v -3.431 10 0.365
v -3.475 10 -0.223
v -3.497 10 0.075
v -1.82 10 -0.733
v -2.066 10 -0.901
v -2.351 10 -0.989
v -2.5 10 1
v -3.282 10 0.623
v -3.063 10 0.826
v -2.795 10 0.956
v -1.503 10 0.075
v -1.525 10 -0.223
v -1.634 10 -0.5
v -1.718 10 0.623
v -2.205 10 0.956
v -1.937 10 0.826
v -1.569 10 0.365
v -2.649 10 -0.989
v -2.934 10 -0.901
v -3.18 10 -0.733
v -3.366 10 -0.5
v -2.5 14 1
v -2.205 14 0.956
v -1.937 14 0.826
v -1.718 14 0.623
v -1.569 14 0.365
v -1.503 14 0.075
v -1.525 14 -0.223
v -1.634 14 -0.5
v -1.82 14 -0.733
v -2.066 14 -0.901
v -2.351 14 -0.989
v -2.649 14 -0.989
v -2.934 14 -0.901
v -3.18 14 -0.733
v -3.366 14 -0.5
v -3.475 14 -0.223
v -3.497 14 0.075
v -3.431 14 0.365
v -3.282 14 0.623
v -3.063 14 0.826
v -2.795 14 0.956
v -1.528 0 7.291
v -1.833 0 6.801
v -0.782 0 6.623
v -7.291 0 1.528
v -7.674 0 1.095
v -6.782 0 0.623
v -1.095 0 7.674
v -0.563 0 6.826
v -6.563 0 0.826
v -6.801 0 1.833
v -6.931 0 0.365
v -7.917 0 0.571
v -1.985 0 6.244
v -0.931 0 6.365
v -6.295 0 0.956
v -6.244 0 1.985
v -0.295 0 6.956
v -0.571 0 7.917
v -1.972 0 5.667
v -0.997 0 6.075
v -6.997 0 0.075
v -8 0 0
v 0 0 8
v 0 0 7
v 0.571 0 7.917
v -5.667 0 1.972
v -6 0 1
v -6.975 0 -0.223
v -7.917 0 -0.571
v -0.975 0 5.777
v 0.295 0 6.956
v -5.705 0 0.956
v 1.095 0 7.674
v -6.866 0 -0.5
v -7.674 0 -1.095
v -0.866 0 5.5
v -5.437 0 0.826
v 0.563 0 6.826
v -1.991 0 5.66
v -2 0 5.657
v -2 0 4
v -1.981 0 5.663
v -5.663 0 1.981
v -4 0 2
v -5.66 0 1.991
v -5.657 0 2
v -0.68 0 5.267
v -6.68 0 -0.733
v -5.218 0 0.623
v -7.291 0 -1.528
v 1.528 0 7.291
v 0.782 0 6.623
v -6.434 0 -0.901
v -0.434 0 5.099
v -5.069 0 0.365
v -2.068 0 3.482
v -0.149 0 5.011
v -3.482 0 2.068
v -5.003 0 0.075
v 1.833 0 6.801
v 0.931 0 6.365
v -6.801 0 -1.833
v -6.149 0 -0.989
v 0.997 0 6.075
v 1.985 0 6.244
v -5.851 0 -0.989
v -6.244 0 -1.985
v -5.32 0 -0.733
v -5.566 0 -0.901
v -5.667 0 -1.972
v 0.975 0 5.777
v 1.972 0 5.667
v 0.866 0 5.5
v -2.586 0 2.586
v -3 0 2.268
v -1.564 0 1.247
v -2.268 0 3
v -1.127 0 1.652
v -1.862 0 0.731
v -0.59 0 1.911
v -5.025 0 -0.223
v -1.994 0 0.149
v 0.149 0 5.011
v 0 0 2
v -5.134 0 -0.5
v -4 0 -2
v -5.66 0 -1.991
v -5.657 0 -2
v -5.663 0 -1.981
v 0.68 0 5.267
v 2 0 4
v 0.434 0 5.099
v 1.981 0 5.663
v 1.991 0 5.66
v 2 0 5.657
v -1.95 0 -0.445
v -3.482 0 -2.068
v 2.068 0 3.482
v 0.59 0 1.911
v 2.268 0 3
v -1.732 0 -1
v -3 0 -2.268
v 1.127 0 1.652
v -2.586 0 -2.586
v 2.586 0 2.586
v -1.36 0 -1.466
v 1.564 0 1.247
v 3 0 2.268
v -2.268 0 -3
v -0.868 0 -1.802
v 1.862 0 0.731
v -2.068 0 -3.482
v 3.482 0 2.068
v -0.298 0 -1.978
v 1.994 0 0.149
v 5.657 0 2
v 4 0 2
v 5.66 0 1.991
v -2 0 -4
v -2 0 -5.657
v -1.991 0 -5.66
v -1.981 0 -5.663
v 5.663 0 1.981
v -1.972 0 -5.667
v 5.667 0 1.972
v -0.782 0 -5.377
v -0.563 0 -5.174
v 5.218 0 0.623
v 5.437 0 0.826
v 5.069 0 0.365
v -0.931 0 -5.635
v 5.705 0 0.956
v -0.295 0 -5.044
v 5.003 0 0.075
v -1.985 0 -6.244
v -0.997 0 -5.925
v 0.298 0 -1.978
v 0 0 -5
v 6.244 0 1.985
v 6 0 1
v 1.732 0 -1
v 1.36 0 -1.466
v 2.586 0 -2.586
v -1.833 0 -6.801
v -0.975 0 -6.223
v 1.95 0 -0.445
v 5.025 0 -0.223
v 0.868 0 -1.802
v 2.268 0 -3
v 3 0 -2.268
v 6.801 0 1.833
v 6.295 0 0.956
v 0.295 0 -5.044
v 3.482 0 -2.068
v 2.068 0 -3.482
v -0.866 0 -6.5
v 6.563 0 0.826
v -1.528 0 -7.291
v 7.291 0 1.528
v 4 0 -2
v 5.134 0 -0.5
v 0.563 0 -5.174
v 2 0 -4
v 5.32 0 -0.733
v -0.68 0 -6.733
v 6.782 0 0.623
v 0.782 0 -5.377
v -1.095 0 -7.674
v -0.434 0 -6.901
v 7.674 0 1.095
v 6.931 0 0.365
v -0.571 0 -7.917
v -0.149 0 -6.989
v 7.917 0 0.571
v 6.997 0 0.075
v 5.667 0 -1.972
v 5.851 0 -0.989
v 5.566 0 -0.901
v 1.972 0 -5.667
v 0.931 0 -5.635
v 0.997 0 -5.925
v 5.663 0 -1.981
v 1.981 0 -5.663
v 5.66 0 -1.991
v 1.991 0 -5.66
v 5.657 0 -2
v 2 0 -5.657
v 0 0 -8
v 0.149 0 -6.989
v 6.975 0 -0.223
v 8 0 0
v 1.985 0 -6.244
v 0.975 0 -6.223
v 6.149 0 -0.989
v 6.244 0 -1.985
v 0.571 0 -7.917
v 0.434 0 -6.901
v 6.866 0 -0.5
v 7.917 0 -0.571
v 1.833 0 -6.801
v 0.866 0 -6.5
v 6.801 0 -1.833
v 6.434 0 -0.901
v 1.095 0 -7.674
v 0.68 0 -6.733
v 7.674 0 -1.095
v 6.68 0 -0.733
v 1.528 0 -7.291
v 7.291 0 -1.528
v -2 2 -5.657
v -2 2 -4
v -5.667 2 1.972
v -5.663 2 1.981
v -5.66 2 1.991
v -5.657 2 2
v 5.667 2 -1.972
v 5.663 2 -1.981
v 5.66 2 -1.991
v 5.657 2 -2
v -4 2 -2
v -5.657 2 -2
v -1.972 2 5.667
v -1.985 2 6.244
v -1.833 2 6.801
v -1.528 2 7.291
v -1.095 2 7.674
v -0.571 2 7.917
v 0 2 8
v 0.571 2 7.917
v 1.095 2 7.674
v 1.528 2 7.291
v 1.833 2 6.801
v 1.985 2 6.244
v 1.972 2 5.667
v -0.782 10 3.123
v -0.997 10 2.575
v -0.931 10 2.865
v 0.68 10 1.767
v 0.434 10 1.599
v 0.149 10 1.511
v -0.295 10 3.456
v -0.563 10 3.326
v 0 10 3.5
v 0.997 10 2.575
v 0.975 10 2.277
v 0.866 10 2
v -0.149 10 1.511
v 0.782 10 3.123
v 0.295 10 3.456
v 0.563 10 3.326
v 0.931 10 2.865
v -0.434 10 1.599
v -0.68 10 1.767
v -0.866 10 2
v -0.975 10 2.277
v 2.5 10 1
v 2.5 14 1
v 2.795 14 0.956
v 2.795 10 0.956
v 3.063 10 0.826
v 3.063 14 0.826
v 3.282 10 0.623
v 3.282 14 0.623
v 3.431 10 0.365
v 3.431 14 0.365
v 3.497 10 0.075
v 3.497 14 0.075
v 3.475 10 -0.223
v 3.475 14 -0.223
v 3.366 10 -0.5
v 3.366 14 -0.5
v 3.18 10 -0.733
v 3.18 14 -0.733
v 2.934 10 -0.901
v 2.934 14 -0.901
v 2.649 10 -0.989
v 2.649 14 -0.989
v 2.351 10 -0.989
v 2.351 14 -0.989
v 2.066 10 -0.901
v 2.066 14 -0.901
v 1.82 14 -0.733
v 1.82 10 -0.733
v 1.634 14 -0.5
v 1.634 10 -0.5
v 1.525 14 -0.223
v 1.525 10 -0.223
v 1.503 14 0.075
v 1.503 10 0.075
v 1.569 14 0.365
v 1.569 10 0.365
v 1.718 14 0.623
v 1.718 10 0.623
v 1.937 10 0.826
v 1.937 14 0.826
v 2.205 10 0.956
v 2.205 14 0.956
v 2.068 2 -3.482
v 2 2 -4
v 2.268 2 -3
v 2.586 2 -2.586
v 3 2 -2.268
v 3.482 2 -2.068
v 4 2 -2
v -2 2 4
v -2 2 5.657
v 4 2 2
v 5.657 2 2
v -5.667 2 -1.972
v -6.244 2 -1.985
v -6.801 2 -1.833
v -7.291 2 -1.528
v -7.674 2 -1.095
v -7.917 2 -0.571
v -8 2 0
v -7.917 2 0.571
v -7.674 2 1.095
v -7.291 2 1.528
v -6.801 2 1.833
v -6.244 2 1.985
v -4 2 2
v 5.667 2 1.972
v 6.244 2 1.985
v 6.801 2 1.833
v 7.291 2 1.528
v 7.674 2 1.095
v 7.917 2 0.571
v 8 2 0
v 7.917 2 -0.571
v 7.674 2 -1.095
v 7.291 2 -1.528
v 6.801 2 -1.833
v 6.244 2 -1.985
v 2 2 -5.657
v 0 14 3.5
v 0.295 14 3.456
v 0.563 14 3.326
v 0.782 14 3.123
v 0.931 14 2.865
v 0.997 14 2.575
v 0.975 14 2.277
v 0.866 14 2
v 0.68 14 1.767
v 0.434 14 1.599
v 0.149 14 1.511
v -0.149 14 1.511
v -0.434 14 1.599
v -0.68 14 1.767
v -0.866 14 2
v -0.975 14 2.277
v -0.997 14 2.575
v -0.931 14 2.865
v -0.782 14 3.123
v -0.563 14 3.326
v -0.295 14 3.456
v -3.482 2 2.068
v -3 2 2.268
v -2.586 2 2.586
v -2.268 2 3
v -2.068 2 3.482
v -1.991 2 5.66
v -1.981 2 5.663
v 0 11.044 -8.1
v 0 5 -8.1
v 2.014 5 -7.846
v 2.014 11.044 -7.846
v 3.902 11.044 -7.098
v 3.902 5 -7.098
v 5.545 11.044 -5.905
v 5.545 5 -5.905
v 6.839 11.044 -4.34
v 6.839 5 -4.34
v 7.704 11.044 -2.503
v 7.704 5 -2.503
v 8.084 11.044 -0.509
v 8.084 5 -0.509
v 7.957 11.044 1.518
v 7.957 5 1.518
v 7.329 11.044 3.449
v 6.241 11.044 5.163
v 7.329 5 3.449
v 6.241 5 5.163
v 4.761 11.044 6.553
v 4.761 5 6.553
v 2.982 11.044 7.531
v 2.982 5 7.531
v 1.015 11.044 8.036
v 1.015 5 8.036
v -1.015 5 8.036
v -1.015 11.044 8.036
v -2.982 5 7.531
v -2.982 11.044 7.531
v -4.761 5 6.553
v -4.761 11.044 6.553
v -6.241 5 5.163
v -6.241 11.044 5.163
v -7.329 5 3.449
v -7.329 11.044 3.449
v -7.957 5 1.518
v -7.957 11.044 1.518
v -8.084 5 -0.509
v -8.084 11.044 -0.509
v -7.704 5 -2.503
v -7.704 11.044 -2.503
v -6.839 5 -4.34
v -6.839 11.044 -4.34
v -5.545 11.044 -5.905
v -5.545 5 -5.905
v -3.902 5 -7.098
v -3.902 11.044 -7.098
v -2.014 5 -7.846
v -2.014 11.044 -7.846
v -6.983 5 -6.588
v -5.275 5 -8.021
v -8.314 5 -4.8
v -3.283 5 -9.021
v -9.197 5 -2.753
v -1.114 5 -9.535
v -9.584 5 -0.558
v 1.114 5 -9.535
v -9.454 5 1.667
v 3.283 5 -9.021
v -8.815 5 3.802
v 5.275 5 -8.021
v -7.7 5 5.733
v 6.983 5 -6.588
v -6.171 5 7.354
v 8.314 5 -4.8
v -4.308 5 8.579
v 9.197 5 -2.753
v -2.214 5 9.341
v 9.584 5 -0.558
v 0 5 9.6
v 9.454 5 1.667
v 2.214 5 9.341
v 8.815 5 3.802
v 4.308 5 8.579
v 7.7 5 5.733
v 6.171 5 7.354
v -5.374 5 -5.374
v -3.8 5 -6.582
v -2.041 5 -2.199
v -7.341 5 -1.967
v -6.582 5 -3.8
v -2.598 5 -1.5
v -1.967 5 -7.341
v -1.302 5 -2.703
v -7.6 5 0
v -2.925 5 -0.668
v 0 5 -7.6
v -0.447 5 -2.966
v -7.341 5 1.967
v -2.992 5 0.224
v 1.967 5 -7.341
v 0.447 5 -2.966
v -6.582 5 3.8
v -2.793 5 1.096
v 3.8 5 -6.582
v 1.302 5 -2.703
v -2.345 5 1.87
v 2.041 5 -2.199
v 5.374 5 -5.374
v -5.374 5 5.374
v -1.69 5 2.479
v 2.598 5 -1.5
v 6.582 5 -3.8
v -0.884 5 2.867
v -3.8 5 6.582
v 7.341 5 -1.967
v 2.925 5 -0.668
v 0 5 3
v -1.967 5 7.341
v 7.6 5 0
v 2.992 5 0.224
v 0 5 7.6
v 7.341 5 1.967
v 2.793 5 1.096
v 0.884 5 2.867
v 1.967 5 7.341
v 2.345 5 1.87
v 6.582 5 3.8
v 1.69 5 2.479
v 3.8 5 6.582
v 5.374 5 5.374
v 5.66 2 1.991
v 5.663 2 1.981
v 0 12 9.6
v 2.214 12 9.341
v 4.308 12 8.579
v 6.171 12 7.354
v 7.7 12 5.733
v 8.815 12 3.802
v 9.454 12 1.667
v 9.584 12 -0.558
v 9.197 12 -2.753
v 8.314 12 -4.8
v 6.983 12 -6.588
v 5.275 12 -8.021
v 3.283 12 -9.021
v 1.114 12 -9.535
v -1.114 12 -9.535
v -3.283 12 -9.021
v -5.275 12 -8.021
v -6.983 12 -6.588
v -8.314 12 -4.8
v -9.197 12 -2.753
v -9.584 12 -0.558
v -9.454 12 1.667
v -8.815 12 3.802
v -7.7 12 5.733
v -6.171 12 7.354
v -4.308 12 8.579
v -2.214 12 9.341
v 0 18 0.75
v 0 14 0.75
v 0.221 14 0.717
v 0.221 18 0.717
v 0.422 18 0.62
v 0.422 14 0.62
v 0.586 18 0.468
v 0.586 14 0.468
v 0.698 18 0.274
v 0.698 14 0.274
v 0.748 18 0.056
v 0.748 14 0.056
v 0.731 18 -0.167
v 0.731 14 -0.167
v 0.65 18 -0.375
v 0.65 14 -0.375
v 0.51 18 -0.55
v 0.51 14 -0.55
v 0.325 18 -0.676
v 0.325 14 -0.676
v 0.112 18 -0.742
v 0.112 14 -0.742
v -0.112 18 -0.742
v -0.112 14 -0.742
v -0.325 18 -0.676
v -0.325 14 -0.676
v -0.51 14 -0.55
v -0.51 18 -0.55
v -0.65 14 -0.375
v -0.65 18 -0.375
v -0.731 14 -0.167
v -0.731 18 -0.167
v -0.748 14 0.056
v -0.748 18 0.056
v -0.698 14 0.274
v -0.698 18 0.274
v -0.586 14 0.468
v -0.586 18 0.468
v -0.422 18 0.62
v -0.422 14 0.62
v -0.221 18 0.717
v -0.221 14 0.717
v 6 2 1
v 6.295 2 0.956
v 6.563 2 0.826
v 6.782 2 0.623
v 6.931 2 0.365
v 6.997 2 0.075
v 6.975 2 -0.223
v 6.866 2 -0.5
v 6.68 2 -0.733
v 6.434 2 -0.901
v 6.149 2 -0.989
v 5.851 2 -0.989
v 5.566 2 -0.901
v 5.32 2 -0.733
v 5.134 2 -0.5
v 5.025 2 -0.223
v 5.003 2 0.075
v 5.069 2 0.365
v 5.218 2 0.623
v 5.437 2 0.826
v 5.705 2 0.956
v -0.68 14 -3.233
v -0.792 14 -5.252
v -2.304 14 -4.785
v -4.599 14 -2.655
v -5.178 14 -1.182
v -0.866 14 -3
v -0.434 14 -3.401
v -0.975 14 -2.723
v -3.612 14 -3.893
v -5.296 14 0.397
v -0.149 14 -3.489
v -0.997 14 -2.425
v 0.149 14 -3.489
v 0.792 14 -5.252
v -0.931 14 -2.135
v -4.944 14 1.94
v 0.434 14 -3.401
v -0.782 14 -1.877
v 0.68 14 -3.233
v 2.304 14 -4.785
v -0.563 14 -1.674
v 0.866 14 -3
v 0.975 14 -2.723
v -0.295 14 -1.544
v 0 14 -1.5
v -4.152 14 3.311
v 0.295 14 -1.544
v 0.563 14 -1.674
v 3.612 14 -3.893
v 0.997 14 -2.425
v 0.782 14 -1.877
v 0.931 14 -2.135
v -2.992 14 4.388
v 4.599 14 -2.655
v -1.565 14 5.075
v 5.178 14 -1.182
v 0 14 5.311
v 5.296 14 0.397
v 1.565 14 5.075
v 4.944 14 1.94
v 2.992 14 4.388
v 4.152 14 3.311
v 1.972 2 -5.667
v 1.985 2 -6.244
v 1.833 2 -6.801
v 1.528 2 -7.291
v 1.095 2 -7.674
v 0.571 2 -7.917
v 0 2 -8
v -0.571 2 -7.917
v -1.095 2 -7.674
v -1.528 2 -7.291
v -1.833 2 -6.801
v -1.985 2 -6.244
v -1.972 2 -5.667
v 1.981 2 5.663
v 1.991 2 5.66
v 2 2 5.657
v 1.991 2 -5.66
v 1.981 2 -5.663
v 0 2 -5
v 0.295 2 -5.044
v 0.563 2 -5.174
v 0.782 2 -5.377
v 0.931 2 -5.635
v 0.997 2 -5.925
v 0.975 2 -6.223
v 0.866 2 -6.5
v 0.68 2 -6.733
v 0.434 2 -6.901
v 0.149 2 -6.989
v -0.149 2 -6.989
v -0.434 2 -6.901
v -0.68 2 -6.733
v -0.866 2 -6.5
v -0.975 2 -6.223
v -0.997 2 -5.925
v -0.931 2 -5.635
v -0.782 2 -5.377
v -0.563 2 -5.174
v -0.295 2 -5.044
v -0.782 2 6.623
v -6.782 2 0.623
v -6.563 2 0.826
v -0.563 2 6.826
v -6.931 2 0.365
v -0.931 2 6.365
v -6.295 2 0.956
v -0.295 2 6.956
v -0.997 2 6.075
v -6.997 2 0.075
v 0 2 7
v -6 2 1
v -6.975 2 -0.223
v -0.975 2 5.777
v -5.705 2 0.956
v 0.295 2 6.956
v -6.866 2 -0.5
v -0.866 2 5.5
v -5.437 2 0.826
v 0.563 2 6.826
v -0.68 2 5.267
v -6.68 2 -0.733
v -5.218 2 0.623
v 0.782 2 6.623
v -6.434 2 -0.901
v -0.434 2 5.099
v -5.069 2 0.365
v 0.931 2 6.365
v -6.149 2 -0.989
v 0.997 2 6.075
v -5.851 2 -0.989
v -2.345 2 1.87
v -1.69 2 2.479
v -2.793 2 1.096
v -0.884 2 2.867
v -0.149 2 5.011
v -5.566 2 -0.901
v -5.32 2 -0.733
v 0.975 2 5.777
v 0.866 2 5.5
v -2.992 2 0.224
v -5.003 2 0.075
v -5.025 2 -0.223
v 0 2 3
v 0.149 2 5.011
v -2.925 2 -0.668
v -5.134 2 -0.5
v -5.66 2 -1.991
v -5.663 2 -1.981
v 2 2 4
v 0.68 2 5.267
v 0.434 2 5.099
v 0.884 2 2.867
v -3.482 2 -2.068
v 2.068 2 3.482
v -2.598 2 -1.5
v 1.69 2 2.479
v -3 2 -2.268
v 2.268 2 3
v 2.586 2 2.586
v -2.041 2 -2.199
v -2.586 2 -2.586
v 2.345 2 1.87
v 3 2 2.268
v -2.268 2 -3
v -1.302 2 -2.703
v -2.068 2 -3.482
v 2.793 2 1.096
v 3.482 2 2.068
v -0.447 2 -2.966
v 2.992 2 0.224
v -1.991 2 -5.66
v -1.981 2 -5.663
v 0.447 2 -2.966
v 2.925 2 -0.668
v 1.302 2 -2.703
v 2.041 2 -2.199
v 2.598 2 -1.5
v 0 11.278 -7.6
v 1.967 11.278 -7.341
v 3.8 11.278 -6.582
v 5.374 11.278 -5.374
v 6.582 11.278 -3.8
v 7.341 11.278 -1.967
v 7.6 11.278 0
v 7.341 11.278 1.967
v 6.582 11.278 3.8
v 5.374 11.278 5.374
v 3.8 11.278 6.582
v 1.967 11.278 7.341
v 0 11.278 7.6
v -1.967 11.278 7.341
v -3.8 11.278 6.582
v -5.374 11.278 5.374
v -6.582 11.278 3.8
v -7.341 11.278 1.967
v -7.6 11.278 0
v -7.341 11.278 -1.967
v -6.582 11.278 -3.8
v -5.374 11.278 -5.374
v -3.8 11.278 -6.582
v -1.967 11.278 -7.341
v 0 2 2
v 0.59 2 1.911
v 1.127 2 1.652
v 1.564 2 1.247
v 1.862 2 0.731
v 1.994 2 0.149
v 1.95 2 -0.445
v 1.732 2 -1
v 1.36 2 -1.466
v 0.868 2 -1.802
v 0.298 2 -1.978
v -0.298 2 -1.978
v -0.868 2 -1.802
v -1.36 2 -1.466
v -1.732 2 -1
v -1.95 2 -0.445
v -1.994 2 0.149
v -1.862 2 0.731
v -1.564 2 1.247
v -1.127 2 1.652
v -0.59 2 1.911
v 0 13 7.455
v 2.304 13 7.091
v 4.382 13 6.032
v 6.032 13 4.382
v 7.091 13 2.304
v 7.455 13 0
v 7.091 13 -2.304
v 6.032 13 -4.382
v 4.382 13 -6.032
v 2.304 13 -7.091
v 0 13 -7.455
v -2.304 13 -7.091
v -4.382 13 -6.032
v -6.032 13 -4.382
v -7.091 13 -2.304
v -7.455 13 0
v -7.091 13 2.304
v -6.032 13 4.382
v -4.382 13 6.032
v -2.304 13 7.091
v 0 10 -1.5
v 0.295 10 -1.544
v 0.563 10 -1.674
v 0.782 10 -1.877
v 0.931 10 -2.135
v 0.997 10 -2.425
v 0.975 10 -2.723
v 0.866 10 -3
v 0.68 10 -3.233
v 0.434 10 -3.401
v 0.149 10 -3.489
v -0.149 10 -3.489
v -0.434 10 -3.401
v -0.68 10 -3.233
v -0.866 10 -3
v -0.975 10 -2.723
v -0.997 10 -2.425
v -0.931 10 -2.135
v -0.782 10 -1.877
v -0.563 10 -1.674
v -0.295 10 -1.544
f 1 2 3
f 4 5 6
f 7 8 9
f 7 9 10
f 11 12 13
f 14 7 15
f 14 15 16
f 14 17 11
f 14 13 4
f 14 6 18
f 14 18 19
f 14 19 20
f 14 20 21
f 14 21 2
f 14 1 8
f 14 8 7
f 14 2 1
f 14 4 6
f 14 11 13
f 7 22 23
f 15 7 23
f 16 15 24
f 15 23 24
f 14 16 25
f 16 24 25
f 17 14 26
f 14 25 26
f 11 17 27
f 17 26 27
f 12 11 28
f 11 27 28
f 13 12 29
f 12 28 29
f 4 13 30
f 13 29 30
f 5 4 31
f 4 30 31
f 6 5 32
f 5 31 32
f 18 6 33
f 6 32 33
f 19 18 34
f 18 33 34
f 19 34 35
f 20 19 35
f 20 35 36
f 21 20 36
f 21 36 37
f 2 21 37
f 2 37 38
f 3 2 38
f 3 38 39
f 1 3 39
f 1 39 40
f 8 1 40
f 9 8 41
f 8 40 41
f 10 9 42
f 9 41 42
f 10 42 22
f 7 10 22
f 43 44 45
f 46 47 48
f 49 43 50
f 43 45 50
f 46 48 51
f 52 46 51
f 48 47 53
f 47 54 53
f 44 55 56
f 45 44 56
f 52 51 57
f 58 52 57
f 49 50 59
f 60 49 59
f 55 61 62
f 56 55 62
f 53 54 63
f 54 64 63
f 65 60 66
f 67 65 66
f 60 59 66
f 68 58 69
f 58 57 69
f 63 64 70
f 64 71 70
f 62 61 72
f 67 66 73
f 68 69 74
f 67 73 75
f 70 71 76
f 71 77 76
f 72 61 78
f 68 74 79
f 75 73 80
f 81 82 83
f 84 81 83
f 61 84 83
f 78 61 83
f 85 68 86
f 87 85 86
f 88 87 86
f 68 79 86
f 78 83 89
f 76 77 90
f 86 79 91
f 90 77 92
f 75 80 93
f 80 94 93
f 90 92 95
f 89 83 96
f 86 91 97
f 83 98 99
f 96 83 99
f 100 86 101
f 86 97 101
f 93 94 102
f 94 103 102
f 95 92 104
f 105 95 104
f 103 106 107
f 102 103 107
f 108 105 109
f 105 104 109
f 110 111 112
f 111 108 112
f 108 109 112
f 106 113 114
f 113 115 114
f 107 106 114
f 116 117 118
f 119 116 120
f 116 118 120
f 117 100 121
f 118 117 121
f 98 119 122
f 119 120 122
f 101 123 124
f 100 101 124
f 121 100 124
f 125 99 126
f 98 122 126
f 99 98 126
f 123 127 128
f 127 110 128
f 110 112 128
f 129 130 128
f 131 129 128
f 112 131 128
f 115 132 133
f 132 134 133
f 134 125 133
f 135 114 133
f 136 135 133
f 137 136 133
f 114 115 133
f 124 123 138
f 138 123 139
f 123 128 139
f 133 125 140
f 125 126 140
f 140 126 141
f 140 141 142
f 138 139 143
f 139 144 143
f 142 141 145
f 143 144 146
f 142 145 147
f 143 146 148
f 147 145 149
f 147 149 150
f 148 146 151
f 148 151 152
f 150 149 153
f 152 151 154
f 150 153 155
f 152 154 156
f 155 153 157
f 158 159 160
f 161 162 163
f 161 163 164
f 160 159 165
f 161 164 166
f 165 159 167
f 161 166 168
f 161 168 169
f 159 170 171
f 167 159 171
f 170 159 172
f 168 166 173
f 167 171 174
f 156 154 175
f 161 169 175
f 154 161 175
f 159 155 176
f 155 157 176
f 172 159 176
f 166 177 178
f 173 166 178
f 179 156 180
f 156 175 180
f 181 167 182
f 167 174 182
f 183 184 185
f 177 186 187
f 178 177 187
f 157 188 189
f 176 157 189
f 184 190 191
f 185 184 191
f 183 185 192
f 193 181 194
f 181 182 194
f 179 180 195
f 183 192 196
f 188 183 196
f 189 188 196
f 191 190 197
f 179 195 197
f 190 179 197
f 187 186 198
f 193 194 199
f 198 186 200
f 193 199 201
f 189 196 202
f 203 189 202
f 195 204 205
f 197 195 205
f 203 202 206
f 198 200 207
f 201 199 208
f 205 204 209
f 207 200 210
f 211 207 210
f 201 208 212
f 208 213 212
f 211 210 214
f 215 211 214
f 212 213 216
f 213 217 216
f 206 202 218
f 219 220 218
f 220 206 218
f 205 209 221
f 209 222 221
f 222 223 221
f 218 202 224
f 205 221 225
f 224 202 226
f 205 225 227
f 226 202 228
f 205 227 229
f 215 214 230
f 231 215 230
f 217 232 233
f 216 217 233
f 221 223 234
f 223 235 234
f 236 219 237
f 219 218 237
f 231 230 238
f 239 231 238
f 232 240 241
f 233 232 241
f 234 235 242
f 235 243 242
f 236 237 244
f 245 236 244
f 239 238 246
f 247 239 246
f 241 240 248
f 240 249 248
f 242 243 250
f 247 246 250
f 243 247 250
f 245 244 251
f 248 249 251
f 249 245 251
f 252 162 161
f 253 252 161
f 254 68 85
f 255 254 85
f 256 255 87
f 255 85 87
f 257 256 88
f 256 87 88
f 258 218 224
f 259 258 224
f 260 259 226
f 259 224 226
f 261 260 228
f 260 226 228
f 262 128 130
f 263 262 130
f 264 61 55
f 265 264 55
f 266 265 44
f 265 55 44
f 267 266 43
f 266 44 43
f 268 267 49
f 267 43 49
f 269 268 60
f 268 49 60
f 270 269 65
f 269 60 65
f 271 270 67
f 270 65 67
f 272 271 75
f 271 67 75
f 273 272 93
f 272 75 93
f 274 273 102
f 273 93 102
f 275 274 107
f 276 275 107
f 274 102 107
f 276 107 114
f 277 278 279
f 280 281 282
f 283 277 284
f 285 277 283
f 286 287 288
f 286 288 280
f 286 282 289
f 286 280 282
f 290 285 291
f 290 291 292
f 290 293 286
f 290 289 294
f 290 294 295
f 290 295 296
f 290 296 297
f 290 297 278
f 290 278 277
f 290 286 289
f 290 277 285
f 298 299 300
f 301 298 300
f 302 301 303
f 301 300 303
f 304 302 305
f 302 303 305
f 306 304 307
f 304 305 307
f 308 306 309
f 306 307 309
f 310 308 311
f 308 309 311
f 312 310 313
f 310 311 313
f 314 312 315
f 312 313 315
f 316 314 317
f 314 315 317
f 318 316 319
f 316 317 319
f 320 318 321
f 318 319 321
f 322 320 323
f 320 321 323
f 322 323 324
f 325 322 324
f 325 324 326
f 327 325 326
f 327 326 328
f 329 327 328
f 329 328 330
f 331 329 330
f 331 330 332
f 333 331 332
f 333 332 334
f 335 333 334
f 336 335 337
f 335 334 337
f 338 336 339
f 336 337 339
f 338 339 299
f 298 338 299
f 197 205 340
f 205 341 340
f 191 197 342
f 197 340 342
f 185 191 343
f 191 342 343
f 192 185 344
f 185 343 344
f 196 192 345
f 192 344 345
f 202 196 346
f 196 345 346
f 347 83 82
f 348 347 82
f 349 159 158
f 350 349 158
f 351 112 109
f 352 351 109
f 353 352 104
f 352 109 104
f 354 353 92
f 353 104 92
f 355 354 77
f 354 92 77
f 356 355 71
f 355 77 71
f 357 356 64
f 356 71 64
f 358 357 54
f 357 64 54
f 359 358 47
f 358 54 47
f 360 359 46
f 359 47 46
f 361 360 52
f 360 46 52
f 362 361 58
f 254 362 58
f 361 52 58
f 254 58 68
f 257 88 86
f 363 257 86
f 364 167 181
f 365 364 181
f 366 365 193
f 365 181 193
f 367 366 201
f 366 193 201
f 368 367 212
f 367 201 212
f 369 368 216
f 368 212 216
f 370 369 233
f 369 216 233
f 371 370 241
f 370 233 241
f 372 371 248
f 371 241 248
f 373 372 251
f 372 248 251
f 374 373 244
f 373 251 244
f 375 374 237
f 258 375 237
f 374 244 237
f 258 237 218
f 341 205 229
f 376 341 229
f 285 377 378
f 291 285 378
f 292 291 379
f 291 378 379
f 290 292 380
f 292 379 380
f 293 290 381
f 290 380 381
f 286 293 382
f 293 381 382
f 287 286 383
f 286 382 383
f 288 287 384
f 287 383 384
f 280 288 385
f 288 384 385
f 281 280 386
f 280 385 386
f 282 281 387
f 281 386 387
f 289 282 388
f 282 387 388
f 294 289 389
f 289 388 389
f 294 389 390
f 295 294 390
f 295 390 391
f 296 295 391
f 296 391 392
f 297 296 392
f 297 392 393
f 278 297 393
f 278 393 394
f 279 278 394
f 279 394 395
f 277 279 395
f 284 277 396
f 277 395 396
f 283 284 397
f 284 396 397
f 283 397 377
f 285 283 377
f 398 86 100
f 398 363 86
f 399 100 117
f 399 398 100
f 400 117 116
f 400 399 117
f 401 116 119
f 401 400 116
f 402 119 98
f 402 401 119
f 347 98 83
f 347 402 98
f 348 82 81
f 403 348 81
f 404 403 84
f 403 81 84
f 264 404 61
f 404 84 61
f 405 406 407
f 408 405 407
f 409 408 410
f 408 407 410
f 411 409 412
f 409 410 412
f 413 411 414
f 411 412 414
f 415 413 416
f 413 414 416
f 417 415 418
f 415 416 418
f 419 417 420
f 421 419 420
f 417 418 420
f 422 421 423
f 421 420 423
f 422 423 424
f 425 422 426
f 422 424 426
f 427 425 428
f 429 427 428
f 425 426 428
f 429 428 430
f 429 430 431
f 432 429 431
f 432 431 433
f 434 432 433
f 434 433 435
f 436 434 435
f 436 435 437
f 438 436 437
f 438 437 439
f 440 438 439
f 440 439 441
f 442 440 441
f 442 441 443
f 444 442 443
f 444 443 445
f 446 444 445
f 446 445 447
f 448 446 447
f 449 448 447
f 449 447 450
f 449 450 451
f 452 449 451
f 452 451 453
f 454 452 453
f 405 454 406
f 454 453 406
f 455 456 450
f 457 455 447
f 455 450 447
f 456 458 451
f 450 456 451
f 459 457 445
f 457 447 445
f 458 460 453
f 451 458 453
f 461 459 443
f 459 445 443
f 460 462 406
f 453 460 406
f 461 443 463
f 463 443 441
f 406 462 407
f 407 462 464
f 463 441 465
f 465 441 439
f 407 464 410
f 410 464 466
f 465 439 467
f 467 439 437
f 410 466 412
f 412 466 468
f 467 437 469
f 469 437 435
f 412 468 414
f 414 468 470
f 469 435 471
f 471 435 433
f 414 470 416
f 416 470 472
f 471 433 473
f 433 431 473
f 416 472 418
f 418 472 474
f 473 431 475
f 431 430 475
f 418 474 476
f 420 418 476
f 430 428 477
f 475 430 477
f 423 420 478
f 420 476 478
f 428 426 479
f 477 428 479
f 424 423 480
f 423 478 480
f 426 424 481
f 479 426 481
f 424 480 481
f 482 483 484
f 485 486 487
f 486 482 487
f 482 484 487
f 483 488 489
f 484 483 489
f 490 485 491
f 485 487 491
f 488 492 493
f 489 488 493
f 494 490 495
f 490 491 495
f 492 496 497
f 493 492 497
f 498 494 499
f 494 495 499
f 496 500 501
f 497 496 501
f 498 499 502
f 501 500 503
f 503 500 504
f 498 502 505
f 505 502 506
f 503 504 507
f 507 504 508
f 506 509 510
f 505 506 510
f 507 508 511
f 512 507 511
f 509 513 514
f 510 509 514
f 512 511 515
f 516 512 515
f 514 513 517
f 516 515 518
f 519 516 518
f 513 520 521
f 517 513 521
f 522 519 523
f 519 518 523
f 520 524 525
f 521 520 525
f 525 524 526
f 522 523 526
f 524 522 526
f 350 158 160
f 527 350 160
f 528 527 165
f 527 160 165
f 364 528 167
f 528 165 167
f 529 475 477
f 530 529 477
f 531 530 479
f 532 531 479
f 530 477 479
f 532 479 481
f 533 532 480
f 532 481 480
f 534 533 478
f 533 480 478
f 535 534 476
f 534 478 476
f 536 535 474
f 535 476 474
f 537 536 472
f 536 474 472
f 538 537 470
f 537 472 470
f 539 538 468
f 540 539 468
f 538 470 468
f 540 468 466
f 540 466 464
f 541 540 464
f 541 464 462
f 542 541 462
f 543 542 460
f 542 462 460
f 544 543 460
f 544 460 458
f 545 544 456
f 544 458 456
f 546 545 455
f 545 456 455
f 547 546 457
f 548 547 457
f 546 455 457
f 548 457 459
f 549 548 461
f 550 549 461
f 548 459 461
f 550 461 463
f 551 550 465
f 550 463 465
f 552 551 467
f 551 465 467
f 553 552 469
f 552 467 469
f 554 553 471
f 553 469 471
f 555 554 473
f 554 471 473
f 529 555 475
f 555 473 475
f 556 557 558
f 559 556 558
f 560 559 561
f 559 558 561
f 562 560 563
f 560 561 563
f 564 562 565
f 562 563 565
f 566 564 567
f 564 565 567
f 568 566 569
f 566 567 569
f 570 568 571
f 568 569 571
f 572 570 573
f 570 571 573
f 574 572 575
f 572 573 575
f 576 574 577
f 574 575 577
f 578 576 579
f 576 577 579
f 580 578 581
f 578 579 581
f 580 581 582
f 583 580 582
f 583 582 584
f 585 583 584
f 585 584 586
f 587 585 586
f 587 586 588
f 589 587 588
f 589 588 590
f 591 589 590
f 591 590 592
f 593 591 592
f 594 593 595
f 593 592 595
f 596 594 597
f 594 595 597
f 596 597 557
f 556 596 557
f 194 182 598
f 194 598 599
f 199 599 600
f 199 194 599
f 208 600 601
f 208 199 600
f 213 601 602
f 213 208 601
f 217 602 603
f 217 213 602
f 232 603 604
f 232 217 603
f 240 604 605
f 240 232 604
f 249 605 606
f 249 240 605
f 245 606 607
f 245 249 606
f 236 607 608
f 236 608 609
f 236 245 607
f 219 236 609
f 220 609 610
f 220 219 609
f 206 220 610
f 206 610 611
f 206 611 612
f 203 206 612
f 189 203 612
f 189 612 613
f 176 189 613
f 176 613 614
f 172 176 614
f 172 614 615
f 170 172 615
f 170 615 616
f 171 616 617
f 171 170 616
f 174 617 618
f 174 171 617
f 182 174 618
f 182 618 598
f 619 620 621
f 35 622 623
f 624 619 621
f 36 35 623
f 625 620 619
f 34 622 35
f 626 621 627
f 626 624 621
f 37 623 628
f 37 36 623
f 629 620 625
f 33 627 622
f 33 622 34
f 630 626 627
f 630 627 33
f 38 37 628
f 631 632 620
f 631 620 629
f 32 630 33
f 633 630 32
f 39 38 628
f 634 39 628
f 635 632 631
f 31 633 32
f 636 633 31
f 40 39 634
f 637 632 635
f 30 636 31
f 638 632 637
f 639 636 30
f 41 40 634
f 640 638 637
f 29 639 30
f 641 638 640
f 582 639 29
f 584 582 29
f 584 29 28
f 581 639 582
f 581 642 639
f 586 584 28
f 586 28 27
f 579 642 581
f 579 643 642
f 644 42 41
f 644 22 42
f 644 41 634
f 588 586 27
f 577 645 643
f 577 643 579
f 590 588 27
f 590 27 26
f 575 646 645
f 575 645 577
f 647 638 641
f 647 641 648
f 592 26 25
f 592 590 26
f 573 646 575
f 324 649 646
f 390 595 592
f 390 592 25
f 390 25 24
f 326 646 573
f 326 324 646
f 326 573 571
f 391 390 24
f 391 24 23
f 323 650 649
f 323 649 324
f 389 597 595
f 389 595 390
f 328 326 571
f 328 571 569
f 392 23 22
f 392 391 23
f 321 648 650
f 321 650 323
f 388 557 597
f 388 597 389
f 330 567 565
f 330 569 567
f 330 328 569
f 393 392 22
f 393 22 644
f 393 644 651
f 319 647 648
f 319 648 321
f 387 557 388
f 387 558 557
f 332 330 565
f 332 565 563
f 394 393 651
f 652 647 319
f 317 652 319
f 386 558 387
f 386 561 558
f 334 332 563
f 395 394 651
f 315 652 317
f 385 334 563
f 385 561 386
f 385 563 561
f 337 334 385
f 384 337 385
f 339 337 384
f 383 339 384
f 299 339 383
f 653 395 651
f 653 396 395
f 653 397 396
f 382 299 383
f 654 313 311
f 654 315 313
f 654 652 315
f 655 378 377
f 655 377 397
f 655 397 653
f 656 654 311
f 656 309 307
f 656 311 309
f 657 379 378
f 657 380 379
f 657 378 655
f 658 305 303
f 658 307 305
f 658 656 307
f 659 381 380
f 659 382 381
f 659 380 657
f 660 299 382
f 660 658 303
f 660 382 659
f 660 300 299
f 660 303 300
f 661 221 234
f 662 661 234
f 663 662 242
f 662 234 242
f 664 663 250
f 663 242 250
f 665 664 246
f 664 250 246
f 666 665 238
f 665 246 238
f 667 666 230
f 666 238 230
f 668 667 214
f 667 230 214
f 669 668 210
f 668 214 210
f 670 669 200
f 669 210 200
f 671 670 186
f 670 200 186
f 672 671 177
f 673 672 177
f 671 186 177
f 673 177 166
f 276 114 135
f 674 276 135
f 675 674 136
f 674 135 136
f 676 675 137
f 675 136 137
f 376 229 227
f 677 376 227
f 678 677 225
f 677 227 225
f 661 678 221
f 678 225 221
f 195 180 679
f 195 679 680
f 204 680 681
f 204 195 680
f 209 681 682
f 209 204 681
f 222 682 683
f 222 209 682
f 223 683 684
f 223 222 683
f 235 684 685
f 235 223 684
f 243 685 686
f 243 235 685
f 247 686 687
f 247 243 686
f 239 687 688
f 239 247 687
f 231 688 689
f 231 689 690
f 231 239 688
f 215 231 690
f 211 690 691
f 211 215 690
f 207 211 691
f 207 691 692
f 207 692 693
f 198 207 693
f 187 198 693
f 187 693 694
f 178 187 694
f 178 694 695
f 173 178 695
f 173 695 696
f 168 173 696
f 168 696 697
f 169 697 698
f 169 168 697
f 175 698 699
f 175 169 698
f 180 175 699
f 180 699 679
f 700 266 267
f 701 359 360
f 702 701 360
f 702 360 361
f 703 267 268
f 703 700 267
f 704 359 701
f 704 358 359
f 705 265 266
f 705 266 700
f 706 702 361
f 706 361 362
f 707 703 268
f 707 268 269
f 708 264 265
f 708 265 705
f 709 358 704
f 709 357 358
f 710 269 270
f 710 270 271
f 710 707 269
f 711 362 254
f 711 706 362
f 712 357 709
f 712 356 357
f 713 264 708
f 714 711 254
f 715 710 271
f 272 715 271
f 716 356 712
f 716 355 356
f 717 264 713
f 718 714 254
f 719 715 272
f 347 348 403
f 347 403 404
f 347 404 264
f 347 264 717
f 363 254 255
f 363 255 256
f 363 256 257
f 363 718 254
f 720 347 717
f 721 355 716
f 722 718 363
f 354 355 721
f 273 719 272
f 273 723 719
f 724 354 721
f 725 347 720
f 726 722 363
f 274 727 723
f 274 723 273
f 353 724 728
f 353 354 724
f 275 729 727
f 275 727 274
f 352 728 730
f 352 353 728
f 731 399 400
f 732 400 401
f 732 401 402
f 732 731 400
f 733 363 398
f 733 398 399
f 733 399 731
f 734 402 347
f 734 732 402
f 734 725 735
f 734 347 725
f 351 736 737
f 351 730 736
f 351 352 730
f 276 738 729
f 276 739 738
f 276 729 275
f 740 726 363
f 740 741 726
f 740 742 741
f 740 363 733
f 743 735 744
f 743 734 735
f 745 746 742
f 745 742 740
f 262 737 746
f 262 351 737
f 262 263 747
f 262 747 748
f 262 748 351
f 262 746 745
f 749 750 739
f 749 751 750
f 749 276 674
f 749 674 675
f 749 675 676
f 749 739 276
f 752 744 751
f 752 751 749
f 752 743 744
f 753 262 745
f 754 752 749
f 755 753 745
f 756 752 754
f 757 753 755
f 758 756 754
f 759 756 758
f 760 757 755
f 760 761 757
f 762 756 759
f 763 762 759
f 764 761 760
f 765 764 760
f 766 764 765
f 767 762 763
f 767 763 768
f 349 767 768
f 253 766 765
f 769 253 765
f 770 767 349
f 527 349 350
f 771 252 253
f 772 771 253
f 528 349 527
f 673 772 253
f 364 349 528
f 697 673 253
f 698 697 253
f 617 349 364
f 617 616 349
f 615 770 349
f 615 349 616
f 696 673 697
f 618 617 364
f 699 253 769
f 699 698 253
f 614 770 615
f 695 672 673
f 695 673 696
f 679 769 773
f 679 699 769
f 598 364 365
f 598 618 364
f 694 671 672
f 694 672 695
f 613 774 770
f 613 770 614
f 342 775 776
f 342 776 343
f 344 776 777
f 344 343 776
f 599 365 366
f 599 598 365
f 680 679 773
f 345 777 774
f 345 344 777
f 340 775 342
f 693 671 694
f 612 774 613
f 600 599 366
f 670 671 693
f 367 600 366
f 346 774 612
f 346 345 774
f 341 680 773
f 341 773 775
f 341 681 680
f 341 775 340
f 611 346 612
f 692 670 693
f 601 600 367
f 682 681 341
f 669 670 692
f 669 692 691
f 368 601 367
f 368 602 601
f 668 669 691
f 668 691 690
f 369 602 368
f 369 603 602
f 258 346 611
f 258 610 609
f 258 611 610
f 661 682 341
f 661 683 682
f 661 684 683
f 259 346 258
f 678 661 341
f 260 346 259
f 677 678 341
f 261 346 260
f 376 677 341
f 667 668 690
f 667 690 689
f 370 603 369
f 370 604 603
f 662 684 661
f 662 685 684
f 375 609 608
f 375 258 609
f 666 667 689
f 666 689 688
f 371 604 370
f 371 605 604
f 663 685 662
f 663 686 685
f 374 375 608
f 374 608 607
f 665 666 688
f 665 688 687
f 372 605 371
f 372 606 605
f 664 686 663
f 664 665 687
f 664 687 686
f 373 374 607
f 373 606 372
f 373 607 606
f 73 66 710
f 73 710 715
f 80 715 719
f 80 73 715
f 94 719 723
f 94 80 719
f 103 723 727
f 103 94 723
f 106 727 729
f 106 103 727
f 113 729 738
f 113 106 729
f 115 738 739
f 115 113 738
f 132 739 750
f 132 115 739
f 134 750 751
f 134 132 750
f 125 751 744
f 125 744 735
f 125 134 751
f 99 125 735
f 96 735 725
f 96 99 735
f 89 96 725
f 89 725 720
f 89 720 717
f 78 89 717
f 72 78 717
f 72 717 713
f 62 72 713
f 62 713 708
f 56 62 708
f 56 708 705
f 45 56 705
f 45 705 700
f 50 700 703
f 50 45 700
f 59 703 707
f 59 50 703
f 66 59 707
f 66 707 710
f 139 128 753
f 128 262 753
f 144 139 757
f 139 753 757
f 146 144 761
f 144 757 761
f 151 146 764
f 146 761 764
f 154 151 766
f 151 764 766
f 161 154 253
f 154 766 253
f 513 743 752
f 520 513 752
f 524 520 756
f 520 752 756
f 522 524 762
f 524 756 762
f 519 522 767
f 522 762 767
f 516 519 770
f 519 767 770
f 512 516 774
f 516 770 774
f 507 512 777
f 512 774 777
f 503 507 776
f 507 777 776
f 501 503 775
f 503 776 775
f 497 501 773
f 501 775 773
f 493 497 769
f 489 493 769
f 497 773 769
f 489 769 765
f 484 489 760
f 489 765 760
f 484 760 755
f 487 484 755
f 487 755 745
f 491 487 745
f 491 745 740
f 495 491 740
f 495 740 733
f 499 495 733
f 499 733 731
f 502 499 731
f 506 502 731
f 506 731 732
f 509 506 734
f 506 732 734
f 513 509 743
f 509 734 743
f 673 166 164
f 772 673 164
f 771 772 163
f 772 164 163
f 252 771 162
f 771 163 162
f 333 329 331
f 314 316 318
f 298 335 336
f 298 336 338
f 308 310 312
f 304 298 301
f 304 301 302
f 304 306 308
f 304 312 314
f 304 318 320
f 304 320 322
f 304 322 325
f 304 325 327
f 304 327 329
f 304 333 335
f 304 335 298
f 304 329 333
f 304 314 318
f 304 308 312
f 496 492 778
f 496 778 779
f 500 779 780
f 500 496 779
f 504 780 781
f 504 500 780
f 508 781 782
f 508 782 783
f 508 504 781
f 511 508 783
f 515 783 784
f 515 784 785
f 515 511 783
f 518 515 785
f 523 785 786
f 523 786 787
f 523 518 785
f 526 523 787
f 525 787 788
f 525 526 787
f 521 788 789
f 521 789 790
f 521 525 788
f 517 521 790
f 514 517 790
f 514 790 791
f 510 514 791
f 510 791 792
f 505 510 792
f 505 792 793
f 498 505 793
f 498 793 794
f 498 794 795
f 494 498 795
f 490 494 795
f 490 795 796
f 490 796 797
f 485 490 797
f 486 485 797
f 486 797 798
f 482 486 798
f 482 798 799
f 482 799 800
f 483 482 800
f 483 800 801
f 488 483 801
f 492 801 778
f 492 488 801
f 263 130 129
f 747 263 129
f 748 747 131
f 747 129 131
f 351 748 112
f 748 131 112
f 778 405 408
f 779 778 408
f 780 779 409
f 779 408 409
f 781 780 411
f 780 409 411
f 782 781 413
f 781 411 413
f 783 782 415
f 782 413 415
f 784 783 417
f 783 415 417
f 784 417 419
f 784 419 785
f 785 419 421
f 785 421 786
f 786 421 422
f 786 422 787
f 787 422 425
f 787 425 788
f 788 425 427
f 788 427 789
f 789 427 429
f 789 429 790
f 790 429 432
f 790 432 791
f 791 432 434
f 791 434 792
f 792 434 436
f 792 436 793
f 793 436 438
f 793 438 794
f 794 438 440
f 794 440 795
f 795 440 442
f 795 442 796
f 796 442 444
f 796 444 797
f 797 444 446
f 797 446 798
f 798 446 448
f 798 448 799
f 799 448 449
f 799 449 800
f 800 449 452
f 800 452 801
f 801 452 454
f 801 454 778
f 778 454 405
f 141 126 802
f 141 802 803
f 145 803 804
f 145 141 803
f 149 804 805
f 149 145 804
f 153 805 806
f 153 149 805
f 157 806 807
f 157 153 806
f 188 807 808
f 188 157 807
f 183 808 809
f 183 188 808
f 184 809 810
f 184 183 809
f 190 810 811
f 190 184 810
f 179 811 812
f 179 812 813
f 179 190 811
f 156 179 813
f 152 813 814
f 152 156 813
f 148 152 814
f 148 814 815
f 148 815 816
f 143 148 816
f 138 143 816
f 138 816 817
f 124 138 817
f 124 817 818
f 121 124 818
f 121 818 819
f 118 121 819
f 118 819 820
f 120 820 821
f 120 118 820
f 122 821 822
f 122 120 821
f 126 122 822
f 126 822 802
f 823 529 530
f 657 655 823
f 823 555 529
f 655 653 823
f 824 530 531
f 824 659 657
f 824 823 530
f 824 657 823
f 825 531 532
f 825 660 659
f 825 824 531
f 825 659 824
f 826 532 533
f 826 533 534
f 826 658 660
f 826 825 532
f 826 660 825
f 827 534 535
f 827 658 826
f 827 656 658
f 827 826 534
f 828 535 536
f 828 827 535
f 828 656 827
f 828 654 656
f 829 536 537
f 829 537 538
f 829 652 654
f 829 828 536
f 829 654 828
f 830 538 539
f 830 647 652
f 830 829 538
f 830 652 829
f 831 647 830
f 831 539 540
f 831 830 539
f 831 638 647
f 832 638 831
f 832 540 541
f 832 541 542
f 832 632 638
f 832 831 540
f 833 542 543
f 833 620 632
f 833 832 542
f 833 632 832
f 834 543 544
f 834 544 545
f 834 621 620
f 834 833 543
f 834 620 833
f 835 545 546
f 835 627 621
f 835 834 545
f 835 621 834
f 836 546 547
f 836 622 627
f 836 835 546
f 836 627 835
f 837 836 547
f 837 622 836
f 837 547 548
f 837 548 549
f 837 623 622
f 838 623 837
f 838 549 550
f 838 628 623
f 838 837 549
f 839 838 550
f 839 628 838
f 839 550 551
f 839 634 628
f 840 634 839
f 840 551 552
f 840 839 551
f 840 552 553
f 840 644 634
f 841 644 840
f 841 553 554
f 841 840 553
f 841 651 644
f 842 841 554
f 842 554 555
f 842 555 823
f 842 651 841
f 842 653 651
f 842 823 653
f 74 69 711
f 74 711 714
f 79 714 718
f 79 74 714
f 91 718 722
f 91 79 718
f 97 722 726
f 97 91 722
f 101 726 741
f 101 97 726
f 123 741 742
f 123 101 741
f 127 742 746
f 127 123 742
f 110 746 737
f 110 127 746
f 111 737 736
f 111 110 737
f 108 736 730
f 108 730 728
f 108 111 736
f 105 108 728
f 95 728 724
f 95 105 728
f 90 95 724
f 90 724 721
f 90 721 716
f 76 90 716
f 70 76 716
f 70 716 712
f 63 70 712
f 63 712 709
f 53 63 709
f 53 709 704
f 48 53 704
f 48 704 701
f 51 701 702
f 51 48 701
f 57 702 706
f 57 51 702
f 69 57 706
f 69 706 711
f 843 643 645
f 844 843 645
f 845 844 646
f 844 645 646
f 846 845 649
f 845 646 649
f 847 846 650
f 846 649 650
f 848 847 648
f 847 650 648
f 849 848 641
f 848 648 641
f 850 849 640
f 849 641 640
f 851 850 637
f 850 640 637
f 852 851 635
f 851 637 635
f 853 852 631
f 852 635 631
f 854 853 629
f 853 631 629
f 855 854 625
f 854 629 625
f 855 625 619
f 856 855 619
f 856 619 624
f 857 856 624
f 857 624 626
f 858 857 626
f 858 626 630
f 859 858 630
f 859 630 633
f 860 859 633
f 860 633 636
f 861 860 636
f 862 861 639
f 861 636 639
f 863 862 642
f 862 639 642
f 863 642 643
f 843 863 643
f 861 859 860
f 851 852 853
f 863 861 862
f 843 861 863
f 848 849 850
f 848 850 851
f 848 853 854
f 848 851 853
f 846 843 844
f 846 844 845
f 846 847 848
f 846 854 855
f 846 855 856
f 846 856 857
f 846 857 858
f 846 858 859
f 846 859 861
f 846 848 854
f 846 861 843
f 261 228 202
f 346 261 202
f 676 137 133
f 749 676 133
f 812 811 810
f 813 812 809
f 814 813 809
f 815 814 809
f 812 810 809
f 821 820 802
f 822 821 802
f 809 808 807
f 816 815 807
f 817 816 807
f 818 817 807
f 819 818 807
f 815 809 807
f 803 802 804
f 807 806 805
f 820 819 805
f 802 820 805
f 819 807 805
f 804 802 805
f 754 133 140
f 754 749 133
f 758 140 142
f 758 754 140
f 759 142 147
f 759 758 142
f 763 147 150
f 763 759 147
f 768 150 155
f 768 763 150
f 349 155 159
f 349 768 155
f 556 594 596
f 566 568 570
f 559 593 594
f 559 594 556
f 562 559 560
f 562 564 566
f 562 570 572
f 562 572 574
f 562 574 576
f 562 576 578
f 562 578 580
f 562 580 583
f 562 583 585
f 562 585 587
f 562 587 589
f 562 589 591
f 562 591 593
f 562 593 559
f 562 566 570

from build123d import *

# Parameters (mm, degrees)
SKETCH1_R           = 2
SKETCH1_R_2         = 1
BOSS_EXTRUDE1_DEPTH = 2
FILLET1_R           = 2
SKETCH2_R           = 3
BOSS_EXTRUDE2_DEPTH = 3
SKETCH3_R           = 9.6
BOSS_EXTRUDE3_DEPTH = 9
SKETCH4_R           = 0.75
BOSS_EXTRUDE4_DEPTH = 4
SKETCH5_R           = 1
CUT_EXTRUDE1_DEPTH  = 4
CHAMFER1_SIZE       = 2
CHAMFER1_SIZE2      = 4.289013841
CUT_EXTRUDE2_REACH  = 20.797
SKETCH6_R           = 8.1
SKETCH6_R_2         = 7.6


with BuildPart() as part:
    # Sketch1 → Boss-Extrude1 (new body)
    with BuildSketch(Plane(origin=(0, 0, 0), x_dir=(1, 0, 0), z_dir=(0, 1, 0))):
        with BuildLine():
            Line((-5.656854249, -2), (-2, -2))
            Line((-2, -2), (-2, -5.656854249))
            ThreePointArc((-2, -5.656854249), (-1.986019357, -5.661777734), (-1.972026594, -5.666666667))
            ThreePointArc((-1.972026594, -5.666666667), (0, -8), (1.972026594, -5.666666667))
            ThreePointArc((1.972026594, -5.666666667), (1.986019357, -5.661777734), (2, -5.656854249))
            Line((2, -5.656854249), (2, -2))
            Line((2, -2), (5.656854249, -2))
            ThreePointArc((5.656854249, -2), (5.661777734, -1.986019357), (5.666666667, -1.972026594))
            ThreePointArc((5.666666667, -1.972026594), (8, 0), (5.666666667, 1.972026594))
            ThreePointArc((5.666666667, 1.972026594), (5.661777734, 1.986019357), (5.656854249, 2))
            Line((5.656854249, 2), (2, 2))
            Line((2, 2), (2, 5.656854249))
            ThreePointArc((2, 5.656854249), (1.986019357, 5.661777734), (1.972026594, 5.666666667))
            ThreePointArc((1.972026594, 5.666666667), (0, 8), (-1.972026594, 5.666666667))
            ThreePointArc((-1.972026594, 5.666666667), (-1.986019357, 5.661777734), (-2, 5.656854249))
            Line((-2, 5.656854249), (-2, 2))
            Line((-2, 2), (-5.656854249, 2))
            ThreePointArc((-5.656854249, 2), (-5.661777734, 1.986019357), (-5.666666667, 1.972026594))
            ThreePointArc((-5.666666667, 1.972026594), (-8, 0), (-5.666666667, -1.972026594))
            ThreePointArc((-5.666666667, -1.972026594), (-5.661777734, -1.986019357), (-5.656854249, -2))
        make_face()
        with Locations(Location((0, 0, 0), (0, 0, 270))):
            Circle(SKETCH1_R, mode=Mode.SUBTRACT)
        with Locations(Location((6, 0, 0), (0, 0, 270))):
            Circle(SKETCH1_R_2, mode=Mode.SUBTRACT)
        with Locations(Location((0, 6, 0), (0, 0, 270))):
            Circle(SKETCH1_R_2, mode=Mode.SUBTRACT)
        with Locations(Location((-6, 0, 0), (0, 0, 270))):
            Circle(SKETCH1_R_2, mode=Mode.SUBTRACT)
        with Locations(Location((0, -6, 0), (0, 0, 270))):
            Circle(SKETCH1_R_2, mode=Mode.SUBTRACT)
    extrude(amount=BOSS_EXTRUDE1_DEPTH)

    # Fillet1
    fillet1_edges = [part.edges().sort_by_distance(p)[0] for p in [
        (2, 1, 2),
        (-2, 1, 2),
        (-2, 1, -2),
        (2, 1, -2),
    ]]
    fillet(fillet1_edges, radius=FILLET1_R)

    # Sketch2 → Boss-Extrude2 (add)
    with BuildSketch(Plane(origin=(0, 2, 0), x_dir=(1, 0, 0), z_dir=(0, 1, 0))):
        with Locations(Location((0, 0, 0), (0, 0, 270))):
            Circle(SKETCH2_R)
    extrude(amount=BOSS_EXTRUDE2_DEPTH)

    # Sketch3 → Boss-Extrude3 (add)
    with BuildSketch(Plane(origin=(0, 5, 0), x_dir=(1, 0, 0), z_dir=(0, 1, 0))):
        with Locations(Location((0, 0, 0), (0, 0, 270))):
            Circle(SKETCH3_R)
    extrude(amount=BOSS_EXTRUDE3_DEPTH)

    # Sketch4 → Boss-Extrude4 (add)
    with BuildSketch(Plane(origin=(0, 14, 0), x_dir=(1, 0, 0), z_dir=(0, 1, 0))):
        with Locations(Location((0, 0, 0), (0, 0, 270))):
            Circle(SKETCH4_R)
    extrude(amount=BOSS_EXTRUDE4_DEPTH)

    # Sketch5 → Cut-Extrude1 (cut)
    with BuildSketch(Plane(origin=(0, 14, 0), x_dir=(1, 0, 0), z_dir=(0, 1, 0))):
        with Locations(Location((-2.5, 0, 0), (0, 0, 270))):
            Circle(SKETCH5_R)
        with Locations(Location((0, 2.5, 0), (0, 0, 270))):
            Circle(SKETCH5_R)
        with Locations(Location((2.5, 0, 0), (0, 0, 270))):
            Circle(SKETCH5_R)
        with Locations(Location((0, -2.5, 0), (0, 0, 270))):
            Circle(SKETCH5_R)
    extrude(amount=-CUT_EXTRUDE1_DEPTH, mode=Mode.SUBTRACT)

    # Chamfer1
    chamfer1_edges = [part.edges().sort_by_distance(p)[0] for p in [
        (0, 14, -9.6),
    ]]
    chamfer1_side = [part.faces().sort_by_distance(p)[0] for p in [
        (0, 9.5, -9.6),
    ]]
    chamfer(chamfer1_edges, length=CHAMFER1_SIZE, length2=CHAMFER1_SIZE2, reference=chamfer1_side[0])

    # Cut-Extrude2: up to this cone (the profile starts inside it)
    cut_extrude2_end = Plane(origin=(0, 5, 0), z_dir=(0, -1, 0)).offset(-9.82148564) * Cone(2.145e-06, 111.901942411, 52.180731709, align=(Align.CENTER, Align.CENTER, Align.MIN), mode=Mode.PRIVATE)
    # Sketch6 → Cut-Extrude2 (cut, up to the surface)
    with BuildSketch(Plane.XZ.offset(-5), mode=Mode.PRIVATE) as cut_extrude2_sk1:
        with Locations(Location((0, 0, 0), (0, 0, 270))):
            Circle(SKETCH6_R)
        with Locations(Location((0, 0, 0), (0, 0, 270))):
            Circle(SKETCH6_R_2, mode=Mode.SUBTRACT)
    cut_extrude2_tool1 = extrude(cut_extrude2_sk1.sketch, amount=-CUT_EXTRUDE2_REACH, mode=Mode.PRIVATE) & cut_extrude2_end
    add(cut_extrude2_tool1.solids().sort_by_distance((0, 5, 7.870897))[0], mode=Mode.SUBTRACT)


solid = part.part
